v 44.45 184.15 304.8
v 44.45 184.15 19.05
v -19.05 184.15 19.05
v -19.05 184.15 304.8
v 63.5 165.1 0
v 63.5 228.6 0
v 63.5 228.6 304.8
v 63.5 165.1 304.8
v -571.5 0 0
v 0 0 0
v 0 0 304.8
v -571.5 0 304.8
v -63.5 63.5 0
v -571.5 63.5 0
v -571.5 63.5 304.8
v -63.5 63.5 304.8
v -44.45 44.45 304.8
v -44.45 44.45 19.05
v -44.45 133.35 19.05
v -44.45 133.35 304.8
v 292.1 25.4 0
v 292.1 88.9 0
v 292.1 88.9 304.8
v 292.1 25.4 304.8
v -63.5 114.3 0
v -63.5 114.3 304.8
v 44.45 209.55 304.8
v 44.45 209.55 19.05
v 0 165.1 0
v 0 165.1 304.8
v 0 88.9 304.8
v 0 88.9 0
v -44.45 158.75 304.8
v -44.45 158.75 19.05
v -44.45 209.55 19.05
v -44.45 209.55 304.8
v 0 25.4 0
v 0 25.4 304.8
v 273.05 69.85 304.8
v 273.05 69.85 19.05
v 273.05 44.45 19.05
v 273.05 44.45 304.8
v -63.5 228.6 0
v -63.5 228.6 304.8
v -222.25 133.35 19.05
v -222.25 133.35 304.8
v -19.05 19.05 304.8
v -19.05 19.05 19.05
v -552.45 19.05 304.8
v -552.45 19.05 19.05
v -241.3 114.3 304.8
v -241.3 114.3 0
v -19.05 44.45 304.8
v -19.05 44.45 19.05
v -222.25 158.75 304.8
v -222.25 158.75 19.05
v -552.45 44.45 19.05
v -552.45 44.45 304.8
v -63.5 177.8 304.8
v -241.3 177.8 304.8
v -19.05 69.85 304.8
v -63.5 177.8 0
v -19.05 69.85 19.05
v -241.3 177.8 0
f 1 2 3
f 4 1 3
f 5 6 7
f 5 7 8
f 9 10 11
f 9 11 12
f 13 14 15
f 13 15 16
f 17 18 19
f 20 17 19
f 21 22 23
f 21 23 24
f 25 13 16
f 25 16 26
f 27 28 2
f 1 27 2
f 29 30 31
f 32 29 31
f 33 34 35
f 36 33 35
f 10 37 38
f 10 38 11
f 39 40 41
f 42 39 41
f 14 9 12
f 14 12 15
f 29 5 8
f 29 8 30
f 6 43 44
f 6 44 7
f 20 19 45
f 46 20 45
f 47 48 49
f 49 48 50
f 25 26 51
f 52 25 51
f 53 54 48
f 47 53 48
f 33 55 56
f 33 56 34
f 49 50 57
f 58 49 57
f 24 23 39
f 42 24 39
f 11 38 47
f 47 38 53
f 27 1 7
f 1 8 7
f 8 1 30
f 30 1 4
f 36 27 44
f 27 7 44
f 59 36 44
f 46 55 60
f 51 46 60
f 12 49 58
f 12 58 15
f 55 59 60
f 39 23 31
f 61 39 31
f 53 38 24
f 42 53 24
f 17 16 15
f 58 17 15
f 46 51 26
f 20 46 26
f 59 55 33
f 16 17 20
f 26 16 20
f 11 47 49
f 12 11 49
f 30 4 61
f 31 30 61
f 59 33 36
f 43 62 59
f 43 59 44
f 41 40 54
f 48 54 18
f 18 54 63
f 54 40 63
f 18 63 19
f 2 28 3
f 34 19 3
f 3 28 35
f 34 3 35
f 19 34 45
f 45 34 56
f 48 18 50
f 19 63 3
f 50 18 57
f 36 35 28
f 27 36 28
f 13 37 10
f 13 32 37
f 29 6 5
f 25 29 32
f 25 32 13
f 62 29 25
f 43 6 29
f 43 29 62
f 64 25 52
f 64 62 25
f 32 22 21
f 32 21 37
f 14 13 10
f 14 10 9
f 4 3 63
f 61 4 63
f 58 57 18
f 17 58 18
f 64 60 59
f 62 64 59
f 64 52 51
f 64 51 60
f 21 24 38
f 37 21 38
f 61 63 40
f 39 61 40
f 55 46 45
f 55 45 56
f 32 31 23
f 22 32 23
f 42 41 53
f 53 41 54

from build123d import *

# Parameters (mm, degrees)
BOSS_EXTRUDE1_DEPTH = 304.8
SHELL1_T            = -19.05


with BuildPart() as part:
    # Sketch1 → Boss-Extrude1 (new body)
    with BuildSketch(Plane.XY):
        Polygon((-241.3, 177.8), (-63.5, 177.8), (-63.5, 228.6), (63.5, 228.6), (63.5, 165.1), (0, 165.1), (0, 88.9), (292.1, 88.9), (292.1, 25.4), (0, 25.4), (0, 0), (-571.5, 0), (-571.5, 63.5), (-63.5, 63.5), (-63.5, 114.3), (-241.3, 114.3), align=None)
    extrude(amount=BOSS_EXTRUDE1_DEPTH)

    # Shell1
    shell1_openings = [part.faces().sort_by_distance(p)[0] for p in [
        (-152.4, 168.866563259, 304.8),
    ]]
    offset(amount=SHELL1_T, openings=shell1_openings, kind=Kind.INTERSECTION)


solid = part.part
